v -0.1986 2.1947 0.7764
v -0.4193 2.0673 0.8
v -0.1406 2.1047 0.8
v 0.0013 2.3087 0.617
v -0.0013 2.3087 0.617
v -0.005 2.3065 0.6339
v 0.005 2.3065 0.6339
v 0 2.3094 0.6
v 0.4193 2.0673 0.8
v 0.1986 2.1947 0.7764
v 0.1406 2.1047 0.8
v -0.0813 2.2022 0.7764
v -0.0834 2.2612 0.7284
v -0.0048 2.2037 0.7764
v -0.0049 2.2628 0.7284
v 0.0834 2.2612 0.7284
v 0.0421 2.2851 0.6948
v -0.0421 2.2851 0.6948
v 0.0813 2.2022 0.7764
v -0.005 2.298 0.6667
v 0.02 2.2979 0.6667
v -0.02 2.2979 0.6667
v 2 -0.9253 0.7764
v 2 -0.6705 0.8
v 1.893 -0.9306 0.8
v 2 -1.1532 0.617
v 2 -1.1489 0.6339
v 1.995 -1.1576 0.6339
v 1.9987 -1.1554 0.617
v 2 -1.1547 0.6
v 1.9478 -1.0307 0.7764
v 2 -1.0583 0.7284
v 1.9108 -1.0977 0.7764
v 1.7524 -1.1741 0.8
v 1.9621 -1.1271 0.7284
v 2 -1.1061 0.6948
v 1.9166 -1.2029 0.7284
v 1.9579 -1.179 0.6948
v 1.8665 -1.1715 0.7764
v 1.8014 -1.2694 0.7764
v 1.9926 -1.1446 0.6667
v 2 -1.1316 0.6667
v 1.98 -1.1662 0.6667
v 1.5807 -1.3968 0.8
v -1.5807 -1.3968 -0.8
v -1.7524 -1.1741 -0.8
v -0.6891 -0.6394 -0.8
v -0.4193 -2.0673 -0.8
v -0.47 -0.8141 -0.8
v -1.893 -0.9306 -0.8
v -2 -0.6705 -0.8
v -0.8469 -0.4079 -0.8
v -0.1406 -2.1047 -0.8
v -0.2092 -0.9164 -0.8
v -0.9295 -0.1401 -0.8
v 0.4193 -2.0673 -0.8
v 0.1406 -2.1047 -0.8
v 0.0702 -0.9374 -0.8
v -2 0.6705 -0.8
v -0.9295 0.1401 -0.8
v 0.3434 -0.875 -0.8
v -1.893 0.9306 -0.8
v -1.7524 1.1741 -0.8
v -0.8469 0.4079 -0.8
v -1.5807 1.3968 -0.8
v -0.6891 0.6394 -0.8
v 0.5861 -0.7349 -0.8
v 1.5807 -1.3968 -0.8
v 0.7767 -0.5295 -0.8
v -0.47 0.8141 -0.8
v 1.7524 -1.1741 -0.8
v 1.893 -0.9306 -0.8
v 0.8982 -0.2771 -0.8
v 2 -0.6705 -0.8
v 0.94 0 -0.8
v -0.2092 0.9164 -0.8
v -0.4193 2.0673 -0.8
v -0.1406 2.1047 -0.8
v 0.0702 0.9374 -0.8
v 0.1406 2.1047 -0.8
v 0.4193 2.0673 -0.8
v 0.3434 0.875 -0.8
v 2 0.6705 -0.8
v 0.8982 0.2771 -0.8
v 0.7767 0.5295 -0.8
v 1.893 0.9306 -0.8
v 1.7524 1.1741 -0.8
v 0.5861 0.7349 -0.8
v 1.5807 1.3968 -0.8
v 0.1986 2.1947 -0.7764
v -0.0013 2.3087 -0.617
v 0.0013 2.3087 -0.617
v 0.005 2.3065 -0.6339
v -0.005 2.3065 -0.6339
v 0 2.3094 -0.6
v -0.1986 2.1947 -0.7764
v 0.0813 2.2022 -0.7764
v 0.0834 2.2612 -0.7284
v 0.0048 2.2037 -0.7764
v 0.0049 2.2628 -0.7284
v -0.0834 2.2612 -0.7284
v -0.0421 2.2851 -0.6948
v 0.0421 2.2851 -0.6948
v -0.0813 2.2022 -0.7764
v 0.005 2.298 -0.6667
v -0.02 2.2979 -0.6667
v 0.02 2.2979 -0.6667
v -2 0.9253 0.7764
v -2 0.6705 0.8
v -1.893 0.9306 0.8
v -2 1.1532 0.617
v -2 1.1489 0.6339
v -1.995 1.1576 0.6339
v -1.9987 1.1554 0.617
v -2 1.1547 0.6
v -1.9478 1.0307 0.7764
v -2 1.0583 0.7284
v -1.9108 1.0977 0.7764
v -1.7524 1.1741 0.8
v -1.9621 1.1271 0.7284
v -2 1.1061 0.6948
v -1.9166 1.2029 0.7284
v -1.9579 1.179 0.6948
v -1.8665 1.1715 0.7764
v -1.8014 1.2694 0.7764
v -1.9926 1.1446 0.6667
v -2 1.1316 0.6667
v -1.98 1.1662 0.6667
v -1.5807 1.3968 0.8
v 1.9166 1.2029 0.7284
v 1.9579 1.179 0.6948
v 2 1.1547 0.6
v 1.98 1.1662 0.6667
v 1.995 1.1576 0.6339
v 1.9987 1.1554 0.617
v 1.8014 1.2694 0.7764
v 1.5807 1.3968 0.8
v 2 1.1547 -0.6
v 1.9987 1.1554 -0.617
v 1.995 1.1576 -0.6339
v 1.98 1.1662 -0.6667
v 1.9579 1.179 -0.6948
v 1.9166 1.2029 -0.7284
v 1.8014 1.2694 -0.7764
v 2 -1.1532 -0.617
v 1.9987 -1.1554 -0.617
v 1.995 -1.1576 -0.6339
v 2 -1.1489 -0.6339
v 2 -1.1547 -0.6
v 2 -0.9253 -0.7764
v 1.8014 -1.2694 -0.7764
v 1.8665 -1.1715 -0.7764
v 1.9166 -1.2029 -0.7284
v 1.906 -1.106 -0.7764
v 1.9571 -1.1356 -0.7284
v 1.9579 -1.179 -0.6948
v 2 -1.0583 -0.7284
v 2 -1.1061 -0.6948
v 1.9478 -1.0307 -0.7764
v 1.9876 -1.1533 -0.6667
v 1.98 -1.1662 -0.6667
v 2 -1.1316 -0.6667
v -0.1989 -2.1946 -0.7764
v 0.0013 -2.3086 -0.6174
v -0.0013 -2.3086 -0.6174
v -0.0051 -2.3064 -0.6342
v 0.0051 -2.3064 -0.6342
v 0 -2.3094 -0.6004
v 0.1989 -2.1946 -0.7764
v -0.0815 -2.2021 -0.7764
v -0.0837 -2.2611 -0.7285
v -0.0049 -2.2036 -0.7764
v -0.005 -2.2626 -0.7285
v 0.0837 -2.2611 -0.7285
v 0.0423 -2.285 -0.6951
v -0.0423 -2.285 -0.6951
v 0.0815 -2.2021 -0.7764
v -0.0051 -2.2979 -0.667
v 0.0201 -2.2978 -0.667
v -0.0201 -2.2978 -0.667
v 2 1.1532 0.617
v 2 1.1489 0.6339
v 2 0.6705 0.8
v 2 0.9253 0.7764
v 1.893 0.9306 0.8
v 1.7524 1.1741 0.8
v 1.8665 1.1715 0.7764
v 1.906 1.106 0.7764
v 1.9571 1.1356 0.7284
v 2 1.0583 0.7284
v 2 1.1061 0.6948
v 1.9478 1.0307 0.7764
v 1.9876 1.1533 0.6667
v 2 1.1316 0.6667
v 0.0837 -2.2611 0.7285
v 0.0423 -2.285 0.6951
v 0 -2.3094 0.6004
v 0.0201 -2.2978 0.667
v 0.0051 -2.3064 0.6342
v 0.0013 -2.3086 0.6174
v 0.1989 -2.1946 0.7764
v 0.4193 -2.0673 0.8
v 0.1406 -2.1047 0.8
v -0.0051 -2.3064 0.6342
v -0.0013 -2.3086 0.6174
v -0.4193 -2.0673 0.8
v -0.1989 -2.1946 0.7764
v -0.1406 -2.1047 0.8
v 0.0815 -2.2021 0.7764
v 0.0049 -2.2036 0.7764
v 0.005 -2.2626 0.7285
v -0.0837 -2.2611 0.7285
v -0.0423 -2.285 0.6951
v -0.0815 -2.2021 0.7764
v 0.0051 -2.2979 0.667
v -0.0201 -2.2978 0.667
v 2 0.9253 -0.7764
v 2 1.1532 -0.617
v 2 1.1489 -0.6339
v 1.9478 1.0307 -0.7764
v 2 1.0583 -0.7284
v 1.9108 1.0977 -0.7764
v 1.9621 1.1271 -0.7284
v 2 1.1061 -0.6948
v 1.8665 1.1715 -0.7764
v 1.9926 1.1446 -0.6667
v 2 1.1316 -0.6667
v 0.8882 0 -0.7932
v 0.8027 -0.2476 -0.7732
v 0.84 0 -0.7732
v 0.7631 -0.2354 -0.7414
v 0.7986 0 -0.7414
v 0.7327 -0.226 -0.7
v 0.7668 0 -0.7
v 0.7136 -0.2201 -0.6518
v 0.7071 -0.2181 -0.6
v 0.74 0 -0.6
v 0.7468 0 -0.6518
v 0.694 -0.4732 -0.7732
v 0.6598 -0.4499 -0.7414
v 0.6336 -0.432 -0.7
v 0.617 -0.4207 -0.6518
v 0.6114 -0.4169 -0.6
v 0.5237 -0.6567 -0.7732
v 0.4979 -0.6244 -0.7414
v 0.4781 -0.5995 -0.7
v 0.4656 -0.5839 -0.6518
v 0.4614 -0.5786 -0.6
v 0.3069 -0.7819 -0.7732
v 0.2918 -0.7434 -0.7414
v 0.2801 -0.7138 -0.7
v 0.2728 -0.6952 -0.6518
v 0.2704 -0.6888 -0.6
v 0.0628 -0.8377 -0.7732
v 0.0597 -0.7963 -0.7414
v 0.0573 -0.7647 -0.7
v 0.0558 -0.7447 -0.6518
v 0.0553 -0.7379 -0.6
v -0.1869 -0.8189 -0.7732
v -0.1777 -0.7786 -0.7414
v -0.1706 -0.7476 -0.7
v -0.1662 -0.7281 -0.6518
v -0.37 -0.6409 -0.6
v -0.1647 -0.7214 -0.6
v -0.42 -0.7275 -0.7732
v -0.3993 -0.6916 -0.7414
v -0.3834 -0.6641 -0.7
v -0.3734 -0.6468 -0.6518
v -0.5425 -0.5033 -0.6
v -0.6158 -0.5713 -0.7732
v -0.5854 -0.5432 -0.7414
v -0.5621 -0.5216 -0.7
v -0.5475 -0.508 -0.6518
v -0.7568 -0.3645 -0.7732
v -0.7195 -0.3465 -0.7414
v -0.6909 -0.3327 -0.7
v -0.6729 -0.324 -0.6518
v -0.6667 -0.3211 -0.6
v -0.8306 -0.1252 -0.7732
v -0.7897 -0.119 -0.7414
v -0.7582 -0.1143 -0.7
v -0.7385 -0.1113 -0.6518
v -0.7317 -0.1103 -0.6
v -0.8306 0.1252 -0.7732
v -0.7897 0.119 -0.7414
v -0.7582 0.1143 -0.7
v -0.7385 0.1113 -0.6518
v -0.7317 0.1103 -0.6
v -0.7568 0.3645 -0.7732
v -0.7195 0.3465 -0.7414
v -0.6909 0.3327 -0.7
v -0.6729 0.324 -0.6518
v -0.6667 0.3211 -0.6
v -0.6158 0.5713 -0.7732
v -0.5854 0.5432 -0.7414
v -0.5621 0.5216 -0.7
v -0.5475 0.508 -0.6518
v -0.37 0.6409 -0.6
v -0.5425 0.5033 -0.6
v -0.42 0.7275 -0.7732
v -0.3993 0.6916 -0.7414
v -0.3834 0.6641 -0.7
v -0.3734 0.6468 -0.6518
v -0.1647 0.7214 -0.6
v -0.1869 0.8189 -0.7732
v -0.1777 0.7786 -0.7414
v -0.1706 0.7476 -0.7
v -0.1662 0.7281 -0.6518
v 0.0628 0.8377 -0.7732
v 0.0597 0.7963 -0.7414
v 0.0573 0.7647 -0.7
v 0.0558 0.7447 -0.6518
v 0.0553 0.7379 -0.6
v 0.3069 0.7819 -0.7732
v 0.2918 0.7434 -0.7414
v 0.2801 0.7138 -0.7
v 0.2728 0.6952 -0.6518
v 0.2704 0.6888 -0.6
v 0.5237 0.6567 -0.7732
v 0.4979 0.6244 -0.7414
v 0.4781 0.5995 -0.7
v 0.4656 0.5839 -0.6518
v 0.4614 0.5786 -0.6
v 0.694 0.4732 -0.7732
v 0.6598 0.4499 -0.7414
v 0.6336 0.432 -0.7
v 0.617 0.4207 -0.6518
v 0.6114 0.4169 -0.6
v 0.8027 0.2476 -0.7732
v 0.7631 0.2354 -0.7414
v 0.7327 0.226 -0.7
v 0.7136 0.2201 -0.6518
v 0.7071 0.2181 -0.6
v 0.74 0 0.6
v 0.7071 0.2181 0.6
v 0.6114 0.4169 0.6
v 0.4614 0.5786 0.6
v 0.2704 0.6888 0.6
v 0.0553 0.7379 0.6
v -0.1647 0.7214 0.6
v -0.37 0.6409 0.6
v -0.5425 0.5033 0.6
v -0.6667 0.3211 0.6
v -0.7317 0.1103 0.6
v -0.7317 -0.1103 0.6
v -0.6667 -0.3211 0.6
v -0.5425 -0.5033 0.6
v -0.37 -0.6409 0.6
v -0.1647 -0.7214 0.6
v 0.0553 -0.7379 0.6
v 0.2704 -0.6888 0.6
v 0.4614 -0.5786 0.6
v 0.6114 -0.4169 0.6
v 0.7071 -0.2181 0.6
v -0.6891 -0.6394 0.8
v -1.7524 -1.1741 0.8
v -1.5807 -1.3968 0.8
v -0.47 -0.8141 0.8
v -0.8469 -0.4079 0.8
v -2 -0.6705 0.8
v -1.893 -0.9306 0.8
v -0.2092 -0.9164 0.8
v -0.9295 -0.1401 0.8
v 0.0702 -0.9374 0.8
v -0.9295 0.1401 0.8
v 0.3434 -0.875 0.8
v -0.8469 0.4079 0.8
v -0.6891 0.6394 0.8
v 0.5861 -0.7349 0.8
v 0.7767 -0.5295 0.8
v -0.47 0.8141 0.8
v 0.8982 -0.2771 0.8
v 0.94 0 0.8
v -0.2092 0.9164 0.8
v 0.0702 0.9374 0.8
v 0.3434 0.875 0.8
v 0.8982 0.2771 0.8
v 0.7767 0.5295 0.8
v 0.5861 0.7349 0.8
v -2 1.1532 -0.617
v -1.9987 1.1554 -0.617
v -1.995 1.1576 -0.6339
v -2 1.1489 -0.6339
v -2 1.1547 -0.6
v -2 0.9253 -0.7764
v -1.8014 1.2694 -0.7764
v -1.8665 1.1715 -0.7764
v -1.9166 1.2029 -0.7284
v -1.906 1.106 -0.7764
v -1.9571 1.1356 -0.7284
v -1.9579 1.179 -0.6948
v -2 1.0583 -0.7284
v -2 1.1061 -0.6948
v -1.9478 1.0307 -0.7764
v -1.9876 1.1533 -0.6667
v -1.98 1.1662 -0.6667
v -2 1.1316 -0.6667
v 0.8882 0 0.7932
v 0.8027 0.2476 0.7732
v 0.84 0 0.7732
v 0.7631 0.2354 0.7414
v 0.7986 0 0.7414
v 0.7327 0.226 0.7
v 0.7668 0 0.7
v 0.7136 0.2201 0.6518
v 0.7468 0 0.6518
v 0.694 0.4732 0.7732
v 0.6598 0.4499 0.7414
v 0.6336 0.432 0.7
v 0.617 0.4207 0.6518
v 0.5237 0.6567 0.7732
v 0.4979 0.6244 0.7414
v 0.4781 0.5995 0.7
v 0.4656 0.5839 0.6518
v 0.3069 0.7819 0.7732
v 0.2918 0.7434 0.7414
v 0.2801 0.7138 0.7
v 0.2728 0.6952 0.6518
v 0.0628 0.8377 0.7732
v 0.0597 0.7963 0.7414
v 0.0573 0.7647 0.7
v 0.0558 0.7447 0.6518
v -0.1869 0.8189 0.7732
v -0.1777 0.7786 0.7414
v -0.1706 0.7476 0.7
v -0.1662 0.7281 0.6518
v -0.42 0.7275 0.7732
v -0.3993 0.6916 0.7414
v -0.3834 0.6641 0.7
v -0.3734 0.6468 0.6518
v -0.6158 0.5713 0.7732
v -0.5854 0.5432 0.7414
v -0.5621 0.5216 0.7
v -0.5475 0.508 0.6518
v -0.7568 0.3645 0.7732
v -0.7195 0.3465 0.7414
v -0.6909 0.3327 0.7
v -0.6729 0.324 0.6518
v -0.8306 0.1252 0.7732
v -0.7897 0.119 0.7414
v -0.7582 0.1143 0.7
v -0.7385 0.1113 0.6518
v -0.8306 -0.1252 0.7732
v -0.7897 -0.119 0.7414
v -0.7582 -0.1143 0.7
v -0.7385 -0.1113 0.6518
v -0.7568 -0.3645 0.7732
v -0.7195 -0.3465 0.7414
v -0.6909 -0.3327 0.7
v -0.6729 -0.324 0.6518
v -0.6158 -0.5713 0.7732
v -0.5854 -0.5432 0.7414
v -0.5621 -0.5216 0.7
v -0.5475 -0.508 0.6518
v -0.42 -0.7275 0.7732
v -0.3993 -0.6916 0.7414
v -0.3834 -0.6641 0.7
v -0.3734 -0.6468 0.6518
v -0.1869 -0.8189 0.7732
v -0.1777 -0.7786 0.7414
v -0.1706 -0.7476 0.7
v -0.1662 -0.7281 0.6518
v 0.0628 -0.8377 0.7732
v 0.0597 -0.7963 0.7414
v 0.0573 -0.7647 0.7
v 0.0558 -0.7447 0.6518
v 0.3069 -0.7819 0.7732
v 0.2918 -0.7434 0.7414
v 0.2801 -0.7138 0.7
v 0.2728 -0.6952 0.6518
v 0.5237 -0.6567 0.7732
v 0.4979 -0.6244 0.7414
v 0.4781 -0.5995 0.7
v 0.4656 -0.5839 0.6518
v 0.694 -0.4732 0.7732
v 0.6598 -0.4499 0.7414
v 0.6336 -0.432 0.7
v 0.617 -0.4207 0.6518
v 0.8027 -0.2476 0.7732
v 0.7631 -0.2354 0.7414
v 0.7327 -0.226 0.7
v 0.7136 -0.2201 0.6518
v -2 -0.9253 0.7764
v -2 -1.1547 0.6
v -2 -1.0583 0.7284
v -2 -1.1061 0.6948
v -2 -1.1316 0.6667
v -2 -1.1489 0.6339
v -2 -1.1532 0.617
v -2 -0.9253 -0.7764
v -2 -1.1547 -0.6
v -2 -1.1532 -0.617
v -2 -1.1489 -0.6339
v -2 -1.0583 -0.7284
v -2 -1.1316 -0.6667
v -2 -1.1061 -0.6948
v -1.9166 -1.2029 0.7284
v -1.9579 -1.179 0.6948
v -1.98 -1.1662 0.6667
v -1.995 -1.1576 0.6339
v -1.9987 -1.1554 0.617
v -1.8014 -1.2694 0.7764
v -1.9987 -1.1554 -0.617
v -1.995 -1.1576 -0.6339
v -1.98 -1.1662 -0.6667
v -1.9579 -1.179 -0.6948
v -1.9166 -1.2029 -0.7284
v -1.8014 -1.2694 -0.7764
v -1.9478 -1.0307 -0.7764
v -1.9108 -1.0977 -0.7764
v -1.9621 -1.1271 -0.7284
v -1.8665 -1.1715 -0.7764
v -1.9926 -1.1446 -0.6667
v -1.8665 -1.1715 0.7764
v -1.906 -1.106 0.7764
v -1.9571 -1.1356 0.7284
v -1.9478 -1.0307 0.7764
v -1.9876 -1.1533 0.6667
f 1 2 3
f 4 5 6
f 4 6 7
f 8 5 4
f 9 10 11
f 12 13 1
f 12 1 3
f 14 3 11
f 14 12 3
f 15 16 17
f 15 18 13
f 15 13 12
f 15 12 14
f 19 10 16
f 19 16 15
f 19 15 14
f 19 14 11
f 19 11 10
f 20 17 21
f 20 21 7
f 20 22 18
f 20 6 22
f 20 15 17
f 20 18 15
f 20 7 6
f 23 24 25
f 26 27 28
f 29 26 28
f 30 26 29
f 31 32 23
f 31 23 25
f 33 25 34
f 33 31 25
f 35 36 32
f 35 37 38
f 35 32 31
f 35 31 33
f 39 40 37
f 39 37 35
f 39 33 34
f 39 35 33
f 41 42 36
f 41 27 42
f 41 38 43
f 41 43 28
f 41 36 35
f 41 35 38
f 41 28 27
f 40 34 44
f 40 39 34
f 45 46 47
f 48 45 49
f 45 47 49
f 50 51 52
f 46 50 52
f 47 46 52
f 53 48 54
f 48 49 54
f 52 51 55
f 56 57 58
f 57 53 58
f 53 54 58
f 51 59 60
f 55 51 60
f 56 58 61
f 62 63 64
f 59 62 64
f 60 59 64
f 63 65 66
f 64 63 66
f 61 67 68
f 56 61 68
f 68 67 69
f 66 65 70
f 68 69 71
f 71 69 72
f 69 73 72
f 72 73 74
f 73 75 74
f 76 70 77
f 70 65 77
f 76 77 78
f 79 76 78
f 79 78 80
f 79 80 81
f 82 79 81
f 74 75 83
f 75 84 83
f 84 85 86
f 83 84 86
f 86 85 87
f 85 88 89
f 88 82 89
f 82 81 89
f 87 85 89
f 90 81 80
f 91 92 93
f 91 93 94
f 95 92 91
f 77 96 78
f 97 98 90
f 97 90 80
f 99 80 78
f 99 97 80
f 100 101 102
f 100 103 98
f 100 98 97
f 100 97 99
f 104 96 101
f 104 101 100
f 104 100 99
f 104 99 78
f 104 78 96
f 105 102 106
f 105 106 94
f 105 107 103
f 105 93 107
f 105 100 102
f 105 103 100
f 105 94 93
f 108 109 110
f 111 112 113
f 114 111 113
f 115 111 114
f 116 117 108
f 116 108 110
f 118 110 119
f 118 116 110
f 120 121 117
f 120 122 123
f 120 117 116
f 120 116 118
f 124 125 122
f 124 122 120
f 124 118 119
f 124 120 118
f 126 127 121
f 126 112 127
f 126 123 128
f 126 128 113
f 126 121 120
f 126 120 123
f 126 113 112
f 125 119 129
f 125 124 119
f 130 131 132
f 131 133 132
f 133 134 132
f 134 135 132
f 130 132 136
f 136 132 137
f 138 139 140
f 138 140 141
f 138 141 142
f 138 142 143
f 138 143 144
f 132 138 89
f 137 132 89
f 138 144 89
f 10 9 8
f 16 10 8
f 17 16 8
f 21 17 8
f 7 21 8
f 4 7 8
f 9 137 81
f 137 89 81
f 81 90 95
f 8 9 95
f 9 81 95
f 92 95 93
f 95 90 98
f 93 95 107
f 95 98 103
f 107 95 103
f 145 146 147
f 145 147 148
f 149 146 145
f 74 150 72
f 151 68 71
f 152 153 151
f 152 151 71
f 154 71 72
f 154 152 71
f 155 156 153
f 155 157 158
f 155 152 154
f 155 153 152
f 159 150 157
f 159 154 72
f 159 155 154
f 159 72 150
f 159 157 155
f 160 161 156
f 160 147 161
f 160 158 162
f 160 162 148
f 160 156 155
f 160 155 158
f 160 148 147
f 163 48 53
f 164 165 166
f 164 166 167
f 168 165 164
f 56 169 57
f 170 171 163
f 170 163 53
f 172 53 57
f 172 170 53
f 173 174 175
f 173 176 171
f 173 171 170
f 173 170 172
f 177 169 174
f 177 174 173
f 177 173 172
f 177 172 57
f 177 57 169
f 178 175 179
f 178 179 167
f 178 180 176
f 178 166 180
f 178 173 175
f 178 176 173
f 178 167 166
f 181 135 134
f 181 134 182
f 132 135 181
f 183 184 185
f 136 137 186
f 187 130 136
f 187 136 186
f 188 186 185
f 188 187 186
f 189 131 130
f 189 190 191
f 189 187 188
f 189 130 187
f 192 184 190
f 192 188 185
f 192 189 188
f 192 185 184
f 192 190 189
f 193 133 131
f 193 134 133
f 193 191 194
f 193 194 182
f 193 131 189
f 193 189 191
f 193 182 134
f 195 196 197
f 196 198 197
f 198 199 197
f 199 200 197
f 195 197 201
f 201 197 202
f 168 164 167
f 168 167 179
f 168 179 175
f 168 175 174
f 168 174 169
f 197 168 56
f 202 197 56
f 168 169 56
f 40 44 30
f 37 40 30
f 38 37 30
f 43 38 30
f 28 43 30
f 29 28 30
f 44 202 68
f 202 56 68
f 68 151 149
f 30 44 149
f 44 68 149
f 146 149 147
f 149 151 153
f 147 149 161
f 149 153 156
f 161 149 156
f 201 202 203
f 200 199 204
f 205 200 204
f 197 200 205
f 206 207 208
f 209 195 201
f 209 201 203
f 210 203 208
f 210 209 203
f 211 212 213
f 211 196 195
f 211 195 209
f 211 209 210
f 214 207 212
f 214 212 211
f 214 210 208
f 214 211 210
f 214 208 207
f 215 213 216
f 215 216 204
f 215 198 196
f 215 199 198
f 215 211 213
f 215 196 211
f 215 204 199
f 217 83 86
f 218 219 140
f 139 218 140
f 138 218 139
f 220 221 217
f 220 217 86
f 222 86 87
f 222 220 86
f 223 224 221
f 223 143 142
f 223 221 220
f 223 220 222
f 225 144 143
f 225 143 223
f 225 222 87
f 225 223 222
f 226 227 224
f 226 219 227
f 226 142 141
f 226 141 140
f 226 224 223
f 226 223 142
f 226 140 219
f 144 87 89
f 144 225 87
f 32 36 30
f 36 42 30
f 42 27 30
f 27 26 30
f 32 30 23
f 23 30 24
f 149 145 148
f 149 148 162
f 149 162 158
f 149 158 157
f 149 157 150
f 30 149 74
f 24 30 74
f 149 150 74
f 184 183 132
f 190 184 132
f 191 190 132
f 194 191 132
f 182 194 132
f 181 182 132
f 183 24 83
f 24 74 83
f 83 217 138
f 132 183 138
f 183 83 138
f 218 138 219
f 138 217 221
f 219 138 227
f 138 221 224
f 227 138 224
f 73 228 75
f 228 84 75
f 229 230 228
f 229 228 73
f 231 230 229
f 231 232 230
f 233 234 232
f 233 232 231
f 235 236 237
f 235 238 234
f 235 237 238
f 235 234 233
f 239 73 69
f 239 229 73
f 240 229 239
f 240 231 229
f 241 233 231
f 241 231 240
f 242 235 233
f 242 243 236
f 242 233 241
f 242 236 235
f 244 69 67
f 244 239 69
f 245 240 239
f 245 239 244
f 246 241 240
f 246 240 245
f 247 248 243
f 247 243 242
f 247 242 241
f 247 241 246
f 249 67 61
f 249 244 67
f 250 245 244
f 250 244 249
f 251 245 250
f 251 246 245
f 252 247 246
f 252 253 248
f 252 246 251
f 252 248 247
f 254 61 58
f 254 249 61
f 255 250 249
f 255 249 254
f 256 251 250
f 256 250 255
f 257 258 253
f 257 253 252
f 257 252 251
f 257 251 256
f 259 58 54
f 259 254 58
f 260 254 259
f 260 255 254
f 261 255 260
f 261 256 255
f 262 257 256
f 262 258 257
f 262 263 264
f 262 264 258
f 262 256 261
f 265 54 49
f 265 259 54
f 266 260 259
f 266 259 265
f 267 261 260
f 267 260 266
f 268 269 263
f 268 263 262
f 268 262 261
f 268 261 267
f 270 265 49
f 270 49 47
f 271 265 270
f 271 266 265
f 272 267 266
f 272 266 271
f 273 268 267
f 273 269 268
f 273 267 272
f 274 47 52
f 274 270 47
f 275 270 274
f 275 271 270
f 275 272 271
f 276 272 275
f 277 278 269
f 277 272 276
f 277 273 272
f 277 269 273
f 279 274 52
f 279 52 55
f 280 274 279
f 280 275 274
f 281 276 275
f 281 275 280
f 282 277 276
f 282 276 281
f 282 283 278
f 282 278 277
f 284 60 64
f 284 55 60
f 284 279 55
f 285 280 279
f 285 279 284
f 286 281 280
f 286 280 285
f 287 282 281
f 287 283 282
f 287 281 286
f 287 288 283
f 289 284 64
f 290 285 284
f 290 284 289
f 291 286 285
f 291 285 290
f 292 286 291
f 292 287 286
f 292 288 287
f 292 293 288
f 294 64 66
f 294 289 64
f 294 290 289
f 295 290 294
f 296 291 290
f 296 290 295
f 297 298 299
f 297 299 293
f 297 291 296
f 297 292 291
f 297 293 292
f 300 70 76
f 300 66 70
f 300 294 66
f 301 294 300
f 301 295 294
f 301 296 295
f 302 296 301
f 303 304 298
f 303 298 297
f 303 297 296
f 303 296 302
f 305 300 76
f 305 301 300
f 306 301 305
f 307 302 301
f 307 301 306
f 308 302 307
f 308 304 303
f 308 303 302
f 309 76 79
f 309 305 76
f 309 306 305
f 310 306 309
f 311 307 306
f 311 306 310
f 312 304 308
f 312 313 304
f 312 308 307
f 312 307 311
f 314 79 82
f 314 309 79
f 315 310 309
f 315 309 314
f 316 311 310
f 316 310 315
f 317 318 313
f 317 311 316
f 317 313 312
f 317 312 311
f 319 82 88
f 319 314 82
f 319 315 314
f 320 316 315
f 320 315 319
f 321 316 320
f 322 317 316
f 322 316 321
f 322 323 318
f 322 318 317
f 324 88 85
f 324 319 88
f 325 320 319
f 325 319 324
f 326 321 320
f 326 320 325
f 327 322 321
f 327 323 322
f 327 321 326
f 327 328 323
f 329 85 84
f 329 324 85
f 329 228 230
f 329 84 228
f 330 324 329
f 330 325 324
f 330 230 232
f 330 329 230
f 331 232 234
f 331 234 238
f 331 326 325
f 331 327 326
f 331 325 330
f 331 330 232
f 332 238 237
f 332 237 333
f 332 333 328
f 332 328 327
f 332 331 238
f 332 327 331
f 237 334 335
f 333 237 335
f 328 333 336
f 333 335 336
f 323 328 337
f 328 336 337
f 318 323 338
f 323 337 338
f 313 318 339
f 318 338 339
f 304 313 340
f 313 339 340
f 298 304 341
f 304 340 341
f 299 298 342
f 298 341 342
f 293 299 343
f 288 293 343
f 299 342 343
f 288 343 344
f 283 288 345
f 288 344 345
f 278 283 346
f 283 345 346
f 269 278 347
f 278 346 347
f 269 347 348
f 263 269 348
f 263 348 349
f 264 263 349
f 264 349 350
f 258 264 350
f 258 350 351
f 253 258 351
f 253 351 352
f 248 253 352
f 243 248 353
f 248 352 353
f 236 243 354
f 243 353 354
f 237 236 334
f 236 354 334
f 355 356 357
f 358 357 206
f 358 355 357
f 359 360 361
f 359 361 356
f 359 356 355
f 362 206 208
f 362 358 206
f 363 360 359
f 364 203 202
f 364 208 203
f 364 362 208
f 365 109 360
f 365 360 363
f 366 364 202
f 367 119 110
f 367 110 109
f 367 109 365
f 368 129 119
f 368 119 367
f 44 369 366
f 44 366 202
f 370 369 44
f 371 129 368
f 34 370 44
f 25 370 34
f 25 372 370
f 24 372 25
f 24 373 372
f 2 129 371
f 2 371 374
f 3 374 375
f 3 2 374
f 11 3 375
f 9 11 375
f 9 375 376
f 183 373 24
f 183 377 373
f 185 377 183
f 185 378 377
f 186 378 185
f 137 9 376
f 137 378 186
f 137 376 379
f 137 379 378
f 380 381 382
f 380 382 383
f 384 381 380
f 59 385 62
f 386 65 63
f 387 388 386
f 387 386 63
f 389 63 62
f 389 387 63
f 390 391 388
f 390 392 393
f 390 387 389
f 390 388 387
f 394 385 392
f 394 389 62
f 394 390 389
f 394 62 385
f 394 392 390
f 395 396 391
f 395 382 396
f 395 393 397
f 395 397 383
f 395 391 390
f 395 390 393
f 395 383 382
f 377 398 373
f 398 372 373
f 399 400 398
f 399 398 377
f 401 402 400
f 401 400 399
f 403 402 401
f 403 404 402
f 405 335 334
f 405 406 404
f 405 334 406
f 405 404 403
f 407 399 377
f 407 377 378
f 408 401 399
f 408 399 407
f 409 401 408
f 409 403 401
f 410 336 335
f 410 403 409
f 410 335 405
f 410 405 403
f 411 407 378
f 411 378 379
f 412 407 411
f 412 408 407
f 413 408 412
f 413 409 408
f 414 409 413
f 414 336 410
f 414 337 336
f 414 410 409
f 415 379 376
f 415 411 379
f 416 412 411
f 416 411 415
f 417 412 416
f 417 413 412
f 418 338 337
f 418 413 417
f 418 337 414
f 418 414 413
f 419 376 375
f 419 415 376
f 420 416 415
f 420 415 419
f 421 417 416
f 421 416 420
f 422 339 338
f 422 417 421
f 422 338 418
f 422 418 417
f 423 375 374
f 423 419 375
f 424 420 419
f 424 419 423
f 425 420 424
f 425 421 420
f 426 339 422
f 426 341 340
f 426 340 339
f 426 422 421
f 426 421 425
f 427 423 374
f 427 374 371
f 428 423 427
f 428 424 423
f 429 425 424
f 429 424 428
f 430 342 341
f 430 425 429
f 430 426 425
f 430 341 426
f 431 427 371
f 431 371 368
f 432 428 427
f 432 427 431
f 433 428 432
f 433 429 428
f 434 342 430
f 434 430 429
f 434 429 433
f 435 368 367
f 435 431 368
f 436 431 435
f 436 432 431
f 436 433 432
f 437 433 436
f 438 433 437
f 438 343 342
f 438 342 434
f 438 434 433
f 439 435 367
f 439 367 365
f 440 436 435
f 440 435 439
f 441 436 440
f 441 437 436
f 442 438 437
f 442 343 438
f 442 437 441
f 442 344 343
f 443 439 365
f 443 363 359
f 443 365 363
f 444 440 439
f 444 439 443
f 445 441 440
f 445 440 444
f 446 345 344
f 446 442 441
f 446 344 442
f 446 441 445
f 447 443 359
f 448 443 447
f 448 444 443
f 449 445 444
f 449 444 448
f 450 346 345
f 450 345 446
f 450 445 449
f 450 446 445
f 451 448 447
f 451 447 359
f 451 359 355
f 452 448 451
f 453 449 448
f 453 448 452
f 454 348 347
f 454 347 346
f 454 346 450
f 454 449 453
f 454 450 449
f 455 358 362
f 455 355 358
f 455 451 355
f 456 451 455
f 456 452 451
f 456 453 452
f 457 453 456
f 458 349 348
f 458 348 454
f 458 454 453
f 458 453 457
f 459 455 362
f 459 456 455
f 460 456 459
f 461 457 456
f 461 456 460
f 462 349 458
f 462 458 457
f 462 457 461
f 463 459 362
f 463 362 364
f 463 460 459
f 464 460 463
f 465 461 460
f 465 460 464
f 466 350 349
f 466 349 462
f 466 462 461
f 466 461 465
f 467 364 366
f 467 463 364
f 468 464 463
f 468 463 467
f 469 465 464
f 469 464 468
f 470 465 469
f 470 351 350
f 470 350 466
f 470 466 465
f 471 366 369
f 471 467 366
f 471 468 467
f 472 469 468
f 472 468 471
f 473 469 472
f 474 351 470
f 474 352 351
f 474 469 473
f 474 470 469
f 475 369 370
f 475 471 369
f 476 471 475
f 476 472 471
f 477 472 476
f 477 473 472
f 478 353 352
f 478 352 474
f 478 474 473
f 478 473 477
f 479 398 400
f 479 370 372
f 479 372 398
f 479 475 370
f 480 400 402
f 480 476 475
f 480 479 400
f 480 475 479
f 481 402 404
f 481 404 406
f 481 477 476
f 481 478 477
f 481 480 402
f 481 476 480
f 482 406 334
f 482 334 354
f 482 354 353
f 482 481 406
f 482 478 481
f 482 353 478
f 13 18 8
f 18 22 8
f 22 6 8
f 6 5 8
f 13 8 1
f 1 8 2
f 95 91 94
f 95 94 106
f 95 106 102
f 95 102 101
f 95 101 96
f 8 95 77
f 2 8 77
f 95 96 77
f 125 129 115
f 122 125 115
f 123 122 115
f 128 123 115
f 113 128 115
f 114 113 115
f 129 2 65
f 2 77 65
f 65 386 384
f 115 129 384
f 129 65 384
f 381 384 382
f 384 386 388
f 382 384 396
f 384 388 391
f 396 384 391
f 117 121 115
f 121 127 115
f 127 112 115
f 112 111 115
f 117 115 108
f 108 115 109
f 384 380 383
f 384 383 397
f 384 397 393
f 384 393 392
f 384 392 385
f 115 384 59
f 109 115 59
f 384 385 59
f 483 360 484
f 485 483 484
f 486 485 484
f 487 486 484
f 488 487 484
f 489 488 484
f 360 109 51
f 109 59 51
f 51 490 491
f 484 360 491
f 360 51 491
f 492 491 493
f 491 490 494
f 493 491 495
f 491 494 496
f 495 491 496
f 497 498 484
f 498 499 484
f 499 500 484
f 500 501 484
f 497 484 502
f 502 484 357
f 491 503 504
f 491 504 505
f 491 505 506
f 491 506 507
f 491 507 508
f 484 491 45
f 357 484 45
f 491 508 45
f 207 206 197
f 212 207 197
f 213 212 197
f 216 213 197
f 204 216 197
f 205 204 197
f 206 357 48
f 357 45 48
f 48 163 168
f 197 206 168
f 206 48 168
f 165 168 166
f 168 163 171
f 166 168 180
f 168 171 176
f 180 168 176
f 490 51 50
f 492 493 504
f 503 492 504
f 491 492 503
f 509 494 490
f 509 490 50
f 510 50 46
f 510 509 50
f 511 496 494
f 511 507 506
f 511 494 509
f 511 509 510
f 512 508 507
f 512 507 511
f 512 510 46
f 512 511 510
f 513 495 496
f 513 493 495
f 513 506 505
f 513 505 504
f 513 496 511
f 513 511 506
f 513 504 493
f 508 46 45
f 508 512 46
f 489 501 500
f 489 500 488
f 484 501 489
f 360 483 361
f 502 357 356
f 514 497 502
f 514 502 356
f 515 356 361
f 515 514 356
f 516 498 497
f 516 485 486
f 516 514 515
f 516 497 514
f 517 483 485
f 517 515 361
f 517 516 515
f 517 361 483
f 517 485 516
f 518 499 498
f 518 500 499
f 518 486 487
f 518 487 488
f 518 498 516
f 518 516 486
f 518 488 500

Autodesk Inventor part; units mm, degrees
ref_plane "YZ Plane" through (0, 0, 0) normal (1, 0, 0) x (0, 1, 0)
ref_plane "XZ Plane" through (0, 0, 0) normal (0, 1, 0) x (-1, 0, 0)
ref_plane "XY Plane" through (0, 0, 0) normal (0, 0, 1) x (1, 0, 0)
sketch "Sketch1" plane through (0, 0, 0) normal (0, 0, 1) x (1, 0, 0)
  line L0 (0, -3.2332) -> (0, 3.2332) projected
  line L1 (-2.8, 0) -> (2.8, 0) projected
  line L2 (0, 2.3094) -> (-2, 1.1547)
  line L3 (-2, 1.1547) -> (-2, -1.1547)
  line L4 (-2, -1.1547) -> (0, -2.3094)
  line L5 (0, -2.3094) -> (2, -1.1547)
  line L6 (2, -1.1547) -> (2, 1.1547)
  line L7 (2, 1.1547) -> (0, 2.3094)
  circle A0 centre (0, 0) radius 0.74
  point P0 (-2, 0)
  dimension "d2" = 120
  dimension "d3" = 4
  dimension "d6" = 1.48
extrude "Extrusion2" add sketch "Sketch1" along normal mid plane 1.6
extrude "Extrusion3" cut sketch "Sketch1" along normal through all both and the other way through all contours A0 L1 L0 | L0 L1 A0 | L1 A0 L0 | L0 A0 L1
sketch "Sketch2" plane through (0, 0, 0) normal (1, 0, 0) x (0, 1, 0)
  line L0 (0, -1.1283) -> (0, 1.1697) projected
  line L1 (-2.3094, 0.8) -> (-1.1547, 0.8) projected
  line L2 (-2.3094, -0.8) -> (-2.3094, 0.8) projected
  arc A0 (-2.1094, 0.8) -> (-2.3094, 0.6) centre (-2.1094, 0.6) ccw
  point P0 (0, 0)
  dimension "d14" = 0.2
revolve "Revolution1" cut sketch "Sketch2" angle 360 about axis through (0, 0, -10) along (0, 0, 1)
mirror "Mirror1" about plane through (0, 0, 0) normal (0, 0, 1) of "Revolution1"
fillet "Fillet2" radius 0.2 2 edges at (-0.74, 0, -0.8) (-0.74, 0, 0.8)
thread "Thread2" size "M2x0.4" class "6H" standard "ISO Metric profile" full length
properties part number "empty"
